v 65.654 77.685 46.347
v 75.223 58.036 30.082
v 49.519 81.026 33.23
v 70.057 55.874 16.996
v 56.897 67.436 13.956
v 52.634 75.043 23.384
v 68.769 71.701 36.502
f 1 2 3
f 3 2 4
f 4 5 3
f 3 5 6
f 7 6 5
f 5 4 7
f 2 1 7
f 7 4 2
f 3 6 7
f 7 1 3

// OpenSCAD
// Auto-generated auxetic polyhedron
points = [
    [49.518870, 81.026492, 33.229629],
    [75.223071, 58.036103, 30.081857],
    [65.654382, 77.685114, 46.346851],
    [70.056840, 55.873958, 16.995733],
    [56.897165, 67.436189, 13.956108],
    [52.633814, 75.042843, 23.384456],
    [68.769326, 71.701465, 36.501678],
];

faces = [
    [0, 1, 2],
    [3, 1, 0],
    [0, 4, 3],
    [5, 4, 0],
    [4, 5, 6],
    [6, 3, 4],
    [6, 2, 1],
    [1, 3, 6],
    [6, 5, 0],
    [0, 2, 6],
];

polyhedron(points = points, faces = faces);
